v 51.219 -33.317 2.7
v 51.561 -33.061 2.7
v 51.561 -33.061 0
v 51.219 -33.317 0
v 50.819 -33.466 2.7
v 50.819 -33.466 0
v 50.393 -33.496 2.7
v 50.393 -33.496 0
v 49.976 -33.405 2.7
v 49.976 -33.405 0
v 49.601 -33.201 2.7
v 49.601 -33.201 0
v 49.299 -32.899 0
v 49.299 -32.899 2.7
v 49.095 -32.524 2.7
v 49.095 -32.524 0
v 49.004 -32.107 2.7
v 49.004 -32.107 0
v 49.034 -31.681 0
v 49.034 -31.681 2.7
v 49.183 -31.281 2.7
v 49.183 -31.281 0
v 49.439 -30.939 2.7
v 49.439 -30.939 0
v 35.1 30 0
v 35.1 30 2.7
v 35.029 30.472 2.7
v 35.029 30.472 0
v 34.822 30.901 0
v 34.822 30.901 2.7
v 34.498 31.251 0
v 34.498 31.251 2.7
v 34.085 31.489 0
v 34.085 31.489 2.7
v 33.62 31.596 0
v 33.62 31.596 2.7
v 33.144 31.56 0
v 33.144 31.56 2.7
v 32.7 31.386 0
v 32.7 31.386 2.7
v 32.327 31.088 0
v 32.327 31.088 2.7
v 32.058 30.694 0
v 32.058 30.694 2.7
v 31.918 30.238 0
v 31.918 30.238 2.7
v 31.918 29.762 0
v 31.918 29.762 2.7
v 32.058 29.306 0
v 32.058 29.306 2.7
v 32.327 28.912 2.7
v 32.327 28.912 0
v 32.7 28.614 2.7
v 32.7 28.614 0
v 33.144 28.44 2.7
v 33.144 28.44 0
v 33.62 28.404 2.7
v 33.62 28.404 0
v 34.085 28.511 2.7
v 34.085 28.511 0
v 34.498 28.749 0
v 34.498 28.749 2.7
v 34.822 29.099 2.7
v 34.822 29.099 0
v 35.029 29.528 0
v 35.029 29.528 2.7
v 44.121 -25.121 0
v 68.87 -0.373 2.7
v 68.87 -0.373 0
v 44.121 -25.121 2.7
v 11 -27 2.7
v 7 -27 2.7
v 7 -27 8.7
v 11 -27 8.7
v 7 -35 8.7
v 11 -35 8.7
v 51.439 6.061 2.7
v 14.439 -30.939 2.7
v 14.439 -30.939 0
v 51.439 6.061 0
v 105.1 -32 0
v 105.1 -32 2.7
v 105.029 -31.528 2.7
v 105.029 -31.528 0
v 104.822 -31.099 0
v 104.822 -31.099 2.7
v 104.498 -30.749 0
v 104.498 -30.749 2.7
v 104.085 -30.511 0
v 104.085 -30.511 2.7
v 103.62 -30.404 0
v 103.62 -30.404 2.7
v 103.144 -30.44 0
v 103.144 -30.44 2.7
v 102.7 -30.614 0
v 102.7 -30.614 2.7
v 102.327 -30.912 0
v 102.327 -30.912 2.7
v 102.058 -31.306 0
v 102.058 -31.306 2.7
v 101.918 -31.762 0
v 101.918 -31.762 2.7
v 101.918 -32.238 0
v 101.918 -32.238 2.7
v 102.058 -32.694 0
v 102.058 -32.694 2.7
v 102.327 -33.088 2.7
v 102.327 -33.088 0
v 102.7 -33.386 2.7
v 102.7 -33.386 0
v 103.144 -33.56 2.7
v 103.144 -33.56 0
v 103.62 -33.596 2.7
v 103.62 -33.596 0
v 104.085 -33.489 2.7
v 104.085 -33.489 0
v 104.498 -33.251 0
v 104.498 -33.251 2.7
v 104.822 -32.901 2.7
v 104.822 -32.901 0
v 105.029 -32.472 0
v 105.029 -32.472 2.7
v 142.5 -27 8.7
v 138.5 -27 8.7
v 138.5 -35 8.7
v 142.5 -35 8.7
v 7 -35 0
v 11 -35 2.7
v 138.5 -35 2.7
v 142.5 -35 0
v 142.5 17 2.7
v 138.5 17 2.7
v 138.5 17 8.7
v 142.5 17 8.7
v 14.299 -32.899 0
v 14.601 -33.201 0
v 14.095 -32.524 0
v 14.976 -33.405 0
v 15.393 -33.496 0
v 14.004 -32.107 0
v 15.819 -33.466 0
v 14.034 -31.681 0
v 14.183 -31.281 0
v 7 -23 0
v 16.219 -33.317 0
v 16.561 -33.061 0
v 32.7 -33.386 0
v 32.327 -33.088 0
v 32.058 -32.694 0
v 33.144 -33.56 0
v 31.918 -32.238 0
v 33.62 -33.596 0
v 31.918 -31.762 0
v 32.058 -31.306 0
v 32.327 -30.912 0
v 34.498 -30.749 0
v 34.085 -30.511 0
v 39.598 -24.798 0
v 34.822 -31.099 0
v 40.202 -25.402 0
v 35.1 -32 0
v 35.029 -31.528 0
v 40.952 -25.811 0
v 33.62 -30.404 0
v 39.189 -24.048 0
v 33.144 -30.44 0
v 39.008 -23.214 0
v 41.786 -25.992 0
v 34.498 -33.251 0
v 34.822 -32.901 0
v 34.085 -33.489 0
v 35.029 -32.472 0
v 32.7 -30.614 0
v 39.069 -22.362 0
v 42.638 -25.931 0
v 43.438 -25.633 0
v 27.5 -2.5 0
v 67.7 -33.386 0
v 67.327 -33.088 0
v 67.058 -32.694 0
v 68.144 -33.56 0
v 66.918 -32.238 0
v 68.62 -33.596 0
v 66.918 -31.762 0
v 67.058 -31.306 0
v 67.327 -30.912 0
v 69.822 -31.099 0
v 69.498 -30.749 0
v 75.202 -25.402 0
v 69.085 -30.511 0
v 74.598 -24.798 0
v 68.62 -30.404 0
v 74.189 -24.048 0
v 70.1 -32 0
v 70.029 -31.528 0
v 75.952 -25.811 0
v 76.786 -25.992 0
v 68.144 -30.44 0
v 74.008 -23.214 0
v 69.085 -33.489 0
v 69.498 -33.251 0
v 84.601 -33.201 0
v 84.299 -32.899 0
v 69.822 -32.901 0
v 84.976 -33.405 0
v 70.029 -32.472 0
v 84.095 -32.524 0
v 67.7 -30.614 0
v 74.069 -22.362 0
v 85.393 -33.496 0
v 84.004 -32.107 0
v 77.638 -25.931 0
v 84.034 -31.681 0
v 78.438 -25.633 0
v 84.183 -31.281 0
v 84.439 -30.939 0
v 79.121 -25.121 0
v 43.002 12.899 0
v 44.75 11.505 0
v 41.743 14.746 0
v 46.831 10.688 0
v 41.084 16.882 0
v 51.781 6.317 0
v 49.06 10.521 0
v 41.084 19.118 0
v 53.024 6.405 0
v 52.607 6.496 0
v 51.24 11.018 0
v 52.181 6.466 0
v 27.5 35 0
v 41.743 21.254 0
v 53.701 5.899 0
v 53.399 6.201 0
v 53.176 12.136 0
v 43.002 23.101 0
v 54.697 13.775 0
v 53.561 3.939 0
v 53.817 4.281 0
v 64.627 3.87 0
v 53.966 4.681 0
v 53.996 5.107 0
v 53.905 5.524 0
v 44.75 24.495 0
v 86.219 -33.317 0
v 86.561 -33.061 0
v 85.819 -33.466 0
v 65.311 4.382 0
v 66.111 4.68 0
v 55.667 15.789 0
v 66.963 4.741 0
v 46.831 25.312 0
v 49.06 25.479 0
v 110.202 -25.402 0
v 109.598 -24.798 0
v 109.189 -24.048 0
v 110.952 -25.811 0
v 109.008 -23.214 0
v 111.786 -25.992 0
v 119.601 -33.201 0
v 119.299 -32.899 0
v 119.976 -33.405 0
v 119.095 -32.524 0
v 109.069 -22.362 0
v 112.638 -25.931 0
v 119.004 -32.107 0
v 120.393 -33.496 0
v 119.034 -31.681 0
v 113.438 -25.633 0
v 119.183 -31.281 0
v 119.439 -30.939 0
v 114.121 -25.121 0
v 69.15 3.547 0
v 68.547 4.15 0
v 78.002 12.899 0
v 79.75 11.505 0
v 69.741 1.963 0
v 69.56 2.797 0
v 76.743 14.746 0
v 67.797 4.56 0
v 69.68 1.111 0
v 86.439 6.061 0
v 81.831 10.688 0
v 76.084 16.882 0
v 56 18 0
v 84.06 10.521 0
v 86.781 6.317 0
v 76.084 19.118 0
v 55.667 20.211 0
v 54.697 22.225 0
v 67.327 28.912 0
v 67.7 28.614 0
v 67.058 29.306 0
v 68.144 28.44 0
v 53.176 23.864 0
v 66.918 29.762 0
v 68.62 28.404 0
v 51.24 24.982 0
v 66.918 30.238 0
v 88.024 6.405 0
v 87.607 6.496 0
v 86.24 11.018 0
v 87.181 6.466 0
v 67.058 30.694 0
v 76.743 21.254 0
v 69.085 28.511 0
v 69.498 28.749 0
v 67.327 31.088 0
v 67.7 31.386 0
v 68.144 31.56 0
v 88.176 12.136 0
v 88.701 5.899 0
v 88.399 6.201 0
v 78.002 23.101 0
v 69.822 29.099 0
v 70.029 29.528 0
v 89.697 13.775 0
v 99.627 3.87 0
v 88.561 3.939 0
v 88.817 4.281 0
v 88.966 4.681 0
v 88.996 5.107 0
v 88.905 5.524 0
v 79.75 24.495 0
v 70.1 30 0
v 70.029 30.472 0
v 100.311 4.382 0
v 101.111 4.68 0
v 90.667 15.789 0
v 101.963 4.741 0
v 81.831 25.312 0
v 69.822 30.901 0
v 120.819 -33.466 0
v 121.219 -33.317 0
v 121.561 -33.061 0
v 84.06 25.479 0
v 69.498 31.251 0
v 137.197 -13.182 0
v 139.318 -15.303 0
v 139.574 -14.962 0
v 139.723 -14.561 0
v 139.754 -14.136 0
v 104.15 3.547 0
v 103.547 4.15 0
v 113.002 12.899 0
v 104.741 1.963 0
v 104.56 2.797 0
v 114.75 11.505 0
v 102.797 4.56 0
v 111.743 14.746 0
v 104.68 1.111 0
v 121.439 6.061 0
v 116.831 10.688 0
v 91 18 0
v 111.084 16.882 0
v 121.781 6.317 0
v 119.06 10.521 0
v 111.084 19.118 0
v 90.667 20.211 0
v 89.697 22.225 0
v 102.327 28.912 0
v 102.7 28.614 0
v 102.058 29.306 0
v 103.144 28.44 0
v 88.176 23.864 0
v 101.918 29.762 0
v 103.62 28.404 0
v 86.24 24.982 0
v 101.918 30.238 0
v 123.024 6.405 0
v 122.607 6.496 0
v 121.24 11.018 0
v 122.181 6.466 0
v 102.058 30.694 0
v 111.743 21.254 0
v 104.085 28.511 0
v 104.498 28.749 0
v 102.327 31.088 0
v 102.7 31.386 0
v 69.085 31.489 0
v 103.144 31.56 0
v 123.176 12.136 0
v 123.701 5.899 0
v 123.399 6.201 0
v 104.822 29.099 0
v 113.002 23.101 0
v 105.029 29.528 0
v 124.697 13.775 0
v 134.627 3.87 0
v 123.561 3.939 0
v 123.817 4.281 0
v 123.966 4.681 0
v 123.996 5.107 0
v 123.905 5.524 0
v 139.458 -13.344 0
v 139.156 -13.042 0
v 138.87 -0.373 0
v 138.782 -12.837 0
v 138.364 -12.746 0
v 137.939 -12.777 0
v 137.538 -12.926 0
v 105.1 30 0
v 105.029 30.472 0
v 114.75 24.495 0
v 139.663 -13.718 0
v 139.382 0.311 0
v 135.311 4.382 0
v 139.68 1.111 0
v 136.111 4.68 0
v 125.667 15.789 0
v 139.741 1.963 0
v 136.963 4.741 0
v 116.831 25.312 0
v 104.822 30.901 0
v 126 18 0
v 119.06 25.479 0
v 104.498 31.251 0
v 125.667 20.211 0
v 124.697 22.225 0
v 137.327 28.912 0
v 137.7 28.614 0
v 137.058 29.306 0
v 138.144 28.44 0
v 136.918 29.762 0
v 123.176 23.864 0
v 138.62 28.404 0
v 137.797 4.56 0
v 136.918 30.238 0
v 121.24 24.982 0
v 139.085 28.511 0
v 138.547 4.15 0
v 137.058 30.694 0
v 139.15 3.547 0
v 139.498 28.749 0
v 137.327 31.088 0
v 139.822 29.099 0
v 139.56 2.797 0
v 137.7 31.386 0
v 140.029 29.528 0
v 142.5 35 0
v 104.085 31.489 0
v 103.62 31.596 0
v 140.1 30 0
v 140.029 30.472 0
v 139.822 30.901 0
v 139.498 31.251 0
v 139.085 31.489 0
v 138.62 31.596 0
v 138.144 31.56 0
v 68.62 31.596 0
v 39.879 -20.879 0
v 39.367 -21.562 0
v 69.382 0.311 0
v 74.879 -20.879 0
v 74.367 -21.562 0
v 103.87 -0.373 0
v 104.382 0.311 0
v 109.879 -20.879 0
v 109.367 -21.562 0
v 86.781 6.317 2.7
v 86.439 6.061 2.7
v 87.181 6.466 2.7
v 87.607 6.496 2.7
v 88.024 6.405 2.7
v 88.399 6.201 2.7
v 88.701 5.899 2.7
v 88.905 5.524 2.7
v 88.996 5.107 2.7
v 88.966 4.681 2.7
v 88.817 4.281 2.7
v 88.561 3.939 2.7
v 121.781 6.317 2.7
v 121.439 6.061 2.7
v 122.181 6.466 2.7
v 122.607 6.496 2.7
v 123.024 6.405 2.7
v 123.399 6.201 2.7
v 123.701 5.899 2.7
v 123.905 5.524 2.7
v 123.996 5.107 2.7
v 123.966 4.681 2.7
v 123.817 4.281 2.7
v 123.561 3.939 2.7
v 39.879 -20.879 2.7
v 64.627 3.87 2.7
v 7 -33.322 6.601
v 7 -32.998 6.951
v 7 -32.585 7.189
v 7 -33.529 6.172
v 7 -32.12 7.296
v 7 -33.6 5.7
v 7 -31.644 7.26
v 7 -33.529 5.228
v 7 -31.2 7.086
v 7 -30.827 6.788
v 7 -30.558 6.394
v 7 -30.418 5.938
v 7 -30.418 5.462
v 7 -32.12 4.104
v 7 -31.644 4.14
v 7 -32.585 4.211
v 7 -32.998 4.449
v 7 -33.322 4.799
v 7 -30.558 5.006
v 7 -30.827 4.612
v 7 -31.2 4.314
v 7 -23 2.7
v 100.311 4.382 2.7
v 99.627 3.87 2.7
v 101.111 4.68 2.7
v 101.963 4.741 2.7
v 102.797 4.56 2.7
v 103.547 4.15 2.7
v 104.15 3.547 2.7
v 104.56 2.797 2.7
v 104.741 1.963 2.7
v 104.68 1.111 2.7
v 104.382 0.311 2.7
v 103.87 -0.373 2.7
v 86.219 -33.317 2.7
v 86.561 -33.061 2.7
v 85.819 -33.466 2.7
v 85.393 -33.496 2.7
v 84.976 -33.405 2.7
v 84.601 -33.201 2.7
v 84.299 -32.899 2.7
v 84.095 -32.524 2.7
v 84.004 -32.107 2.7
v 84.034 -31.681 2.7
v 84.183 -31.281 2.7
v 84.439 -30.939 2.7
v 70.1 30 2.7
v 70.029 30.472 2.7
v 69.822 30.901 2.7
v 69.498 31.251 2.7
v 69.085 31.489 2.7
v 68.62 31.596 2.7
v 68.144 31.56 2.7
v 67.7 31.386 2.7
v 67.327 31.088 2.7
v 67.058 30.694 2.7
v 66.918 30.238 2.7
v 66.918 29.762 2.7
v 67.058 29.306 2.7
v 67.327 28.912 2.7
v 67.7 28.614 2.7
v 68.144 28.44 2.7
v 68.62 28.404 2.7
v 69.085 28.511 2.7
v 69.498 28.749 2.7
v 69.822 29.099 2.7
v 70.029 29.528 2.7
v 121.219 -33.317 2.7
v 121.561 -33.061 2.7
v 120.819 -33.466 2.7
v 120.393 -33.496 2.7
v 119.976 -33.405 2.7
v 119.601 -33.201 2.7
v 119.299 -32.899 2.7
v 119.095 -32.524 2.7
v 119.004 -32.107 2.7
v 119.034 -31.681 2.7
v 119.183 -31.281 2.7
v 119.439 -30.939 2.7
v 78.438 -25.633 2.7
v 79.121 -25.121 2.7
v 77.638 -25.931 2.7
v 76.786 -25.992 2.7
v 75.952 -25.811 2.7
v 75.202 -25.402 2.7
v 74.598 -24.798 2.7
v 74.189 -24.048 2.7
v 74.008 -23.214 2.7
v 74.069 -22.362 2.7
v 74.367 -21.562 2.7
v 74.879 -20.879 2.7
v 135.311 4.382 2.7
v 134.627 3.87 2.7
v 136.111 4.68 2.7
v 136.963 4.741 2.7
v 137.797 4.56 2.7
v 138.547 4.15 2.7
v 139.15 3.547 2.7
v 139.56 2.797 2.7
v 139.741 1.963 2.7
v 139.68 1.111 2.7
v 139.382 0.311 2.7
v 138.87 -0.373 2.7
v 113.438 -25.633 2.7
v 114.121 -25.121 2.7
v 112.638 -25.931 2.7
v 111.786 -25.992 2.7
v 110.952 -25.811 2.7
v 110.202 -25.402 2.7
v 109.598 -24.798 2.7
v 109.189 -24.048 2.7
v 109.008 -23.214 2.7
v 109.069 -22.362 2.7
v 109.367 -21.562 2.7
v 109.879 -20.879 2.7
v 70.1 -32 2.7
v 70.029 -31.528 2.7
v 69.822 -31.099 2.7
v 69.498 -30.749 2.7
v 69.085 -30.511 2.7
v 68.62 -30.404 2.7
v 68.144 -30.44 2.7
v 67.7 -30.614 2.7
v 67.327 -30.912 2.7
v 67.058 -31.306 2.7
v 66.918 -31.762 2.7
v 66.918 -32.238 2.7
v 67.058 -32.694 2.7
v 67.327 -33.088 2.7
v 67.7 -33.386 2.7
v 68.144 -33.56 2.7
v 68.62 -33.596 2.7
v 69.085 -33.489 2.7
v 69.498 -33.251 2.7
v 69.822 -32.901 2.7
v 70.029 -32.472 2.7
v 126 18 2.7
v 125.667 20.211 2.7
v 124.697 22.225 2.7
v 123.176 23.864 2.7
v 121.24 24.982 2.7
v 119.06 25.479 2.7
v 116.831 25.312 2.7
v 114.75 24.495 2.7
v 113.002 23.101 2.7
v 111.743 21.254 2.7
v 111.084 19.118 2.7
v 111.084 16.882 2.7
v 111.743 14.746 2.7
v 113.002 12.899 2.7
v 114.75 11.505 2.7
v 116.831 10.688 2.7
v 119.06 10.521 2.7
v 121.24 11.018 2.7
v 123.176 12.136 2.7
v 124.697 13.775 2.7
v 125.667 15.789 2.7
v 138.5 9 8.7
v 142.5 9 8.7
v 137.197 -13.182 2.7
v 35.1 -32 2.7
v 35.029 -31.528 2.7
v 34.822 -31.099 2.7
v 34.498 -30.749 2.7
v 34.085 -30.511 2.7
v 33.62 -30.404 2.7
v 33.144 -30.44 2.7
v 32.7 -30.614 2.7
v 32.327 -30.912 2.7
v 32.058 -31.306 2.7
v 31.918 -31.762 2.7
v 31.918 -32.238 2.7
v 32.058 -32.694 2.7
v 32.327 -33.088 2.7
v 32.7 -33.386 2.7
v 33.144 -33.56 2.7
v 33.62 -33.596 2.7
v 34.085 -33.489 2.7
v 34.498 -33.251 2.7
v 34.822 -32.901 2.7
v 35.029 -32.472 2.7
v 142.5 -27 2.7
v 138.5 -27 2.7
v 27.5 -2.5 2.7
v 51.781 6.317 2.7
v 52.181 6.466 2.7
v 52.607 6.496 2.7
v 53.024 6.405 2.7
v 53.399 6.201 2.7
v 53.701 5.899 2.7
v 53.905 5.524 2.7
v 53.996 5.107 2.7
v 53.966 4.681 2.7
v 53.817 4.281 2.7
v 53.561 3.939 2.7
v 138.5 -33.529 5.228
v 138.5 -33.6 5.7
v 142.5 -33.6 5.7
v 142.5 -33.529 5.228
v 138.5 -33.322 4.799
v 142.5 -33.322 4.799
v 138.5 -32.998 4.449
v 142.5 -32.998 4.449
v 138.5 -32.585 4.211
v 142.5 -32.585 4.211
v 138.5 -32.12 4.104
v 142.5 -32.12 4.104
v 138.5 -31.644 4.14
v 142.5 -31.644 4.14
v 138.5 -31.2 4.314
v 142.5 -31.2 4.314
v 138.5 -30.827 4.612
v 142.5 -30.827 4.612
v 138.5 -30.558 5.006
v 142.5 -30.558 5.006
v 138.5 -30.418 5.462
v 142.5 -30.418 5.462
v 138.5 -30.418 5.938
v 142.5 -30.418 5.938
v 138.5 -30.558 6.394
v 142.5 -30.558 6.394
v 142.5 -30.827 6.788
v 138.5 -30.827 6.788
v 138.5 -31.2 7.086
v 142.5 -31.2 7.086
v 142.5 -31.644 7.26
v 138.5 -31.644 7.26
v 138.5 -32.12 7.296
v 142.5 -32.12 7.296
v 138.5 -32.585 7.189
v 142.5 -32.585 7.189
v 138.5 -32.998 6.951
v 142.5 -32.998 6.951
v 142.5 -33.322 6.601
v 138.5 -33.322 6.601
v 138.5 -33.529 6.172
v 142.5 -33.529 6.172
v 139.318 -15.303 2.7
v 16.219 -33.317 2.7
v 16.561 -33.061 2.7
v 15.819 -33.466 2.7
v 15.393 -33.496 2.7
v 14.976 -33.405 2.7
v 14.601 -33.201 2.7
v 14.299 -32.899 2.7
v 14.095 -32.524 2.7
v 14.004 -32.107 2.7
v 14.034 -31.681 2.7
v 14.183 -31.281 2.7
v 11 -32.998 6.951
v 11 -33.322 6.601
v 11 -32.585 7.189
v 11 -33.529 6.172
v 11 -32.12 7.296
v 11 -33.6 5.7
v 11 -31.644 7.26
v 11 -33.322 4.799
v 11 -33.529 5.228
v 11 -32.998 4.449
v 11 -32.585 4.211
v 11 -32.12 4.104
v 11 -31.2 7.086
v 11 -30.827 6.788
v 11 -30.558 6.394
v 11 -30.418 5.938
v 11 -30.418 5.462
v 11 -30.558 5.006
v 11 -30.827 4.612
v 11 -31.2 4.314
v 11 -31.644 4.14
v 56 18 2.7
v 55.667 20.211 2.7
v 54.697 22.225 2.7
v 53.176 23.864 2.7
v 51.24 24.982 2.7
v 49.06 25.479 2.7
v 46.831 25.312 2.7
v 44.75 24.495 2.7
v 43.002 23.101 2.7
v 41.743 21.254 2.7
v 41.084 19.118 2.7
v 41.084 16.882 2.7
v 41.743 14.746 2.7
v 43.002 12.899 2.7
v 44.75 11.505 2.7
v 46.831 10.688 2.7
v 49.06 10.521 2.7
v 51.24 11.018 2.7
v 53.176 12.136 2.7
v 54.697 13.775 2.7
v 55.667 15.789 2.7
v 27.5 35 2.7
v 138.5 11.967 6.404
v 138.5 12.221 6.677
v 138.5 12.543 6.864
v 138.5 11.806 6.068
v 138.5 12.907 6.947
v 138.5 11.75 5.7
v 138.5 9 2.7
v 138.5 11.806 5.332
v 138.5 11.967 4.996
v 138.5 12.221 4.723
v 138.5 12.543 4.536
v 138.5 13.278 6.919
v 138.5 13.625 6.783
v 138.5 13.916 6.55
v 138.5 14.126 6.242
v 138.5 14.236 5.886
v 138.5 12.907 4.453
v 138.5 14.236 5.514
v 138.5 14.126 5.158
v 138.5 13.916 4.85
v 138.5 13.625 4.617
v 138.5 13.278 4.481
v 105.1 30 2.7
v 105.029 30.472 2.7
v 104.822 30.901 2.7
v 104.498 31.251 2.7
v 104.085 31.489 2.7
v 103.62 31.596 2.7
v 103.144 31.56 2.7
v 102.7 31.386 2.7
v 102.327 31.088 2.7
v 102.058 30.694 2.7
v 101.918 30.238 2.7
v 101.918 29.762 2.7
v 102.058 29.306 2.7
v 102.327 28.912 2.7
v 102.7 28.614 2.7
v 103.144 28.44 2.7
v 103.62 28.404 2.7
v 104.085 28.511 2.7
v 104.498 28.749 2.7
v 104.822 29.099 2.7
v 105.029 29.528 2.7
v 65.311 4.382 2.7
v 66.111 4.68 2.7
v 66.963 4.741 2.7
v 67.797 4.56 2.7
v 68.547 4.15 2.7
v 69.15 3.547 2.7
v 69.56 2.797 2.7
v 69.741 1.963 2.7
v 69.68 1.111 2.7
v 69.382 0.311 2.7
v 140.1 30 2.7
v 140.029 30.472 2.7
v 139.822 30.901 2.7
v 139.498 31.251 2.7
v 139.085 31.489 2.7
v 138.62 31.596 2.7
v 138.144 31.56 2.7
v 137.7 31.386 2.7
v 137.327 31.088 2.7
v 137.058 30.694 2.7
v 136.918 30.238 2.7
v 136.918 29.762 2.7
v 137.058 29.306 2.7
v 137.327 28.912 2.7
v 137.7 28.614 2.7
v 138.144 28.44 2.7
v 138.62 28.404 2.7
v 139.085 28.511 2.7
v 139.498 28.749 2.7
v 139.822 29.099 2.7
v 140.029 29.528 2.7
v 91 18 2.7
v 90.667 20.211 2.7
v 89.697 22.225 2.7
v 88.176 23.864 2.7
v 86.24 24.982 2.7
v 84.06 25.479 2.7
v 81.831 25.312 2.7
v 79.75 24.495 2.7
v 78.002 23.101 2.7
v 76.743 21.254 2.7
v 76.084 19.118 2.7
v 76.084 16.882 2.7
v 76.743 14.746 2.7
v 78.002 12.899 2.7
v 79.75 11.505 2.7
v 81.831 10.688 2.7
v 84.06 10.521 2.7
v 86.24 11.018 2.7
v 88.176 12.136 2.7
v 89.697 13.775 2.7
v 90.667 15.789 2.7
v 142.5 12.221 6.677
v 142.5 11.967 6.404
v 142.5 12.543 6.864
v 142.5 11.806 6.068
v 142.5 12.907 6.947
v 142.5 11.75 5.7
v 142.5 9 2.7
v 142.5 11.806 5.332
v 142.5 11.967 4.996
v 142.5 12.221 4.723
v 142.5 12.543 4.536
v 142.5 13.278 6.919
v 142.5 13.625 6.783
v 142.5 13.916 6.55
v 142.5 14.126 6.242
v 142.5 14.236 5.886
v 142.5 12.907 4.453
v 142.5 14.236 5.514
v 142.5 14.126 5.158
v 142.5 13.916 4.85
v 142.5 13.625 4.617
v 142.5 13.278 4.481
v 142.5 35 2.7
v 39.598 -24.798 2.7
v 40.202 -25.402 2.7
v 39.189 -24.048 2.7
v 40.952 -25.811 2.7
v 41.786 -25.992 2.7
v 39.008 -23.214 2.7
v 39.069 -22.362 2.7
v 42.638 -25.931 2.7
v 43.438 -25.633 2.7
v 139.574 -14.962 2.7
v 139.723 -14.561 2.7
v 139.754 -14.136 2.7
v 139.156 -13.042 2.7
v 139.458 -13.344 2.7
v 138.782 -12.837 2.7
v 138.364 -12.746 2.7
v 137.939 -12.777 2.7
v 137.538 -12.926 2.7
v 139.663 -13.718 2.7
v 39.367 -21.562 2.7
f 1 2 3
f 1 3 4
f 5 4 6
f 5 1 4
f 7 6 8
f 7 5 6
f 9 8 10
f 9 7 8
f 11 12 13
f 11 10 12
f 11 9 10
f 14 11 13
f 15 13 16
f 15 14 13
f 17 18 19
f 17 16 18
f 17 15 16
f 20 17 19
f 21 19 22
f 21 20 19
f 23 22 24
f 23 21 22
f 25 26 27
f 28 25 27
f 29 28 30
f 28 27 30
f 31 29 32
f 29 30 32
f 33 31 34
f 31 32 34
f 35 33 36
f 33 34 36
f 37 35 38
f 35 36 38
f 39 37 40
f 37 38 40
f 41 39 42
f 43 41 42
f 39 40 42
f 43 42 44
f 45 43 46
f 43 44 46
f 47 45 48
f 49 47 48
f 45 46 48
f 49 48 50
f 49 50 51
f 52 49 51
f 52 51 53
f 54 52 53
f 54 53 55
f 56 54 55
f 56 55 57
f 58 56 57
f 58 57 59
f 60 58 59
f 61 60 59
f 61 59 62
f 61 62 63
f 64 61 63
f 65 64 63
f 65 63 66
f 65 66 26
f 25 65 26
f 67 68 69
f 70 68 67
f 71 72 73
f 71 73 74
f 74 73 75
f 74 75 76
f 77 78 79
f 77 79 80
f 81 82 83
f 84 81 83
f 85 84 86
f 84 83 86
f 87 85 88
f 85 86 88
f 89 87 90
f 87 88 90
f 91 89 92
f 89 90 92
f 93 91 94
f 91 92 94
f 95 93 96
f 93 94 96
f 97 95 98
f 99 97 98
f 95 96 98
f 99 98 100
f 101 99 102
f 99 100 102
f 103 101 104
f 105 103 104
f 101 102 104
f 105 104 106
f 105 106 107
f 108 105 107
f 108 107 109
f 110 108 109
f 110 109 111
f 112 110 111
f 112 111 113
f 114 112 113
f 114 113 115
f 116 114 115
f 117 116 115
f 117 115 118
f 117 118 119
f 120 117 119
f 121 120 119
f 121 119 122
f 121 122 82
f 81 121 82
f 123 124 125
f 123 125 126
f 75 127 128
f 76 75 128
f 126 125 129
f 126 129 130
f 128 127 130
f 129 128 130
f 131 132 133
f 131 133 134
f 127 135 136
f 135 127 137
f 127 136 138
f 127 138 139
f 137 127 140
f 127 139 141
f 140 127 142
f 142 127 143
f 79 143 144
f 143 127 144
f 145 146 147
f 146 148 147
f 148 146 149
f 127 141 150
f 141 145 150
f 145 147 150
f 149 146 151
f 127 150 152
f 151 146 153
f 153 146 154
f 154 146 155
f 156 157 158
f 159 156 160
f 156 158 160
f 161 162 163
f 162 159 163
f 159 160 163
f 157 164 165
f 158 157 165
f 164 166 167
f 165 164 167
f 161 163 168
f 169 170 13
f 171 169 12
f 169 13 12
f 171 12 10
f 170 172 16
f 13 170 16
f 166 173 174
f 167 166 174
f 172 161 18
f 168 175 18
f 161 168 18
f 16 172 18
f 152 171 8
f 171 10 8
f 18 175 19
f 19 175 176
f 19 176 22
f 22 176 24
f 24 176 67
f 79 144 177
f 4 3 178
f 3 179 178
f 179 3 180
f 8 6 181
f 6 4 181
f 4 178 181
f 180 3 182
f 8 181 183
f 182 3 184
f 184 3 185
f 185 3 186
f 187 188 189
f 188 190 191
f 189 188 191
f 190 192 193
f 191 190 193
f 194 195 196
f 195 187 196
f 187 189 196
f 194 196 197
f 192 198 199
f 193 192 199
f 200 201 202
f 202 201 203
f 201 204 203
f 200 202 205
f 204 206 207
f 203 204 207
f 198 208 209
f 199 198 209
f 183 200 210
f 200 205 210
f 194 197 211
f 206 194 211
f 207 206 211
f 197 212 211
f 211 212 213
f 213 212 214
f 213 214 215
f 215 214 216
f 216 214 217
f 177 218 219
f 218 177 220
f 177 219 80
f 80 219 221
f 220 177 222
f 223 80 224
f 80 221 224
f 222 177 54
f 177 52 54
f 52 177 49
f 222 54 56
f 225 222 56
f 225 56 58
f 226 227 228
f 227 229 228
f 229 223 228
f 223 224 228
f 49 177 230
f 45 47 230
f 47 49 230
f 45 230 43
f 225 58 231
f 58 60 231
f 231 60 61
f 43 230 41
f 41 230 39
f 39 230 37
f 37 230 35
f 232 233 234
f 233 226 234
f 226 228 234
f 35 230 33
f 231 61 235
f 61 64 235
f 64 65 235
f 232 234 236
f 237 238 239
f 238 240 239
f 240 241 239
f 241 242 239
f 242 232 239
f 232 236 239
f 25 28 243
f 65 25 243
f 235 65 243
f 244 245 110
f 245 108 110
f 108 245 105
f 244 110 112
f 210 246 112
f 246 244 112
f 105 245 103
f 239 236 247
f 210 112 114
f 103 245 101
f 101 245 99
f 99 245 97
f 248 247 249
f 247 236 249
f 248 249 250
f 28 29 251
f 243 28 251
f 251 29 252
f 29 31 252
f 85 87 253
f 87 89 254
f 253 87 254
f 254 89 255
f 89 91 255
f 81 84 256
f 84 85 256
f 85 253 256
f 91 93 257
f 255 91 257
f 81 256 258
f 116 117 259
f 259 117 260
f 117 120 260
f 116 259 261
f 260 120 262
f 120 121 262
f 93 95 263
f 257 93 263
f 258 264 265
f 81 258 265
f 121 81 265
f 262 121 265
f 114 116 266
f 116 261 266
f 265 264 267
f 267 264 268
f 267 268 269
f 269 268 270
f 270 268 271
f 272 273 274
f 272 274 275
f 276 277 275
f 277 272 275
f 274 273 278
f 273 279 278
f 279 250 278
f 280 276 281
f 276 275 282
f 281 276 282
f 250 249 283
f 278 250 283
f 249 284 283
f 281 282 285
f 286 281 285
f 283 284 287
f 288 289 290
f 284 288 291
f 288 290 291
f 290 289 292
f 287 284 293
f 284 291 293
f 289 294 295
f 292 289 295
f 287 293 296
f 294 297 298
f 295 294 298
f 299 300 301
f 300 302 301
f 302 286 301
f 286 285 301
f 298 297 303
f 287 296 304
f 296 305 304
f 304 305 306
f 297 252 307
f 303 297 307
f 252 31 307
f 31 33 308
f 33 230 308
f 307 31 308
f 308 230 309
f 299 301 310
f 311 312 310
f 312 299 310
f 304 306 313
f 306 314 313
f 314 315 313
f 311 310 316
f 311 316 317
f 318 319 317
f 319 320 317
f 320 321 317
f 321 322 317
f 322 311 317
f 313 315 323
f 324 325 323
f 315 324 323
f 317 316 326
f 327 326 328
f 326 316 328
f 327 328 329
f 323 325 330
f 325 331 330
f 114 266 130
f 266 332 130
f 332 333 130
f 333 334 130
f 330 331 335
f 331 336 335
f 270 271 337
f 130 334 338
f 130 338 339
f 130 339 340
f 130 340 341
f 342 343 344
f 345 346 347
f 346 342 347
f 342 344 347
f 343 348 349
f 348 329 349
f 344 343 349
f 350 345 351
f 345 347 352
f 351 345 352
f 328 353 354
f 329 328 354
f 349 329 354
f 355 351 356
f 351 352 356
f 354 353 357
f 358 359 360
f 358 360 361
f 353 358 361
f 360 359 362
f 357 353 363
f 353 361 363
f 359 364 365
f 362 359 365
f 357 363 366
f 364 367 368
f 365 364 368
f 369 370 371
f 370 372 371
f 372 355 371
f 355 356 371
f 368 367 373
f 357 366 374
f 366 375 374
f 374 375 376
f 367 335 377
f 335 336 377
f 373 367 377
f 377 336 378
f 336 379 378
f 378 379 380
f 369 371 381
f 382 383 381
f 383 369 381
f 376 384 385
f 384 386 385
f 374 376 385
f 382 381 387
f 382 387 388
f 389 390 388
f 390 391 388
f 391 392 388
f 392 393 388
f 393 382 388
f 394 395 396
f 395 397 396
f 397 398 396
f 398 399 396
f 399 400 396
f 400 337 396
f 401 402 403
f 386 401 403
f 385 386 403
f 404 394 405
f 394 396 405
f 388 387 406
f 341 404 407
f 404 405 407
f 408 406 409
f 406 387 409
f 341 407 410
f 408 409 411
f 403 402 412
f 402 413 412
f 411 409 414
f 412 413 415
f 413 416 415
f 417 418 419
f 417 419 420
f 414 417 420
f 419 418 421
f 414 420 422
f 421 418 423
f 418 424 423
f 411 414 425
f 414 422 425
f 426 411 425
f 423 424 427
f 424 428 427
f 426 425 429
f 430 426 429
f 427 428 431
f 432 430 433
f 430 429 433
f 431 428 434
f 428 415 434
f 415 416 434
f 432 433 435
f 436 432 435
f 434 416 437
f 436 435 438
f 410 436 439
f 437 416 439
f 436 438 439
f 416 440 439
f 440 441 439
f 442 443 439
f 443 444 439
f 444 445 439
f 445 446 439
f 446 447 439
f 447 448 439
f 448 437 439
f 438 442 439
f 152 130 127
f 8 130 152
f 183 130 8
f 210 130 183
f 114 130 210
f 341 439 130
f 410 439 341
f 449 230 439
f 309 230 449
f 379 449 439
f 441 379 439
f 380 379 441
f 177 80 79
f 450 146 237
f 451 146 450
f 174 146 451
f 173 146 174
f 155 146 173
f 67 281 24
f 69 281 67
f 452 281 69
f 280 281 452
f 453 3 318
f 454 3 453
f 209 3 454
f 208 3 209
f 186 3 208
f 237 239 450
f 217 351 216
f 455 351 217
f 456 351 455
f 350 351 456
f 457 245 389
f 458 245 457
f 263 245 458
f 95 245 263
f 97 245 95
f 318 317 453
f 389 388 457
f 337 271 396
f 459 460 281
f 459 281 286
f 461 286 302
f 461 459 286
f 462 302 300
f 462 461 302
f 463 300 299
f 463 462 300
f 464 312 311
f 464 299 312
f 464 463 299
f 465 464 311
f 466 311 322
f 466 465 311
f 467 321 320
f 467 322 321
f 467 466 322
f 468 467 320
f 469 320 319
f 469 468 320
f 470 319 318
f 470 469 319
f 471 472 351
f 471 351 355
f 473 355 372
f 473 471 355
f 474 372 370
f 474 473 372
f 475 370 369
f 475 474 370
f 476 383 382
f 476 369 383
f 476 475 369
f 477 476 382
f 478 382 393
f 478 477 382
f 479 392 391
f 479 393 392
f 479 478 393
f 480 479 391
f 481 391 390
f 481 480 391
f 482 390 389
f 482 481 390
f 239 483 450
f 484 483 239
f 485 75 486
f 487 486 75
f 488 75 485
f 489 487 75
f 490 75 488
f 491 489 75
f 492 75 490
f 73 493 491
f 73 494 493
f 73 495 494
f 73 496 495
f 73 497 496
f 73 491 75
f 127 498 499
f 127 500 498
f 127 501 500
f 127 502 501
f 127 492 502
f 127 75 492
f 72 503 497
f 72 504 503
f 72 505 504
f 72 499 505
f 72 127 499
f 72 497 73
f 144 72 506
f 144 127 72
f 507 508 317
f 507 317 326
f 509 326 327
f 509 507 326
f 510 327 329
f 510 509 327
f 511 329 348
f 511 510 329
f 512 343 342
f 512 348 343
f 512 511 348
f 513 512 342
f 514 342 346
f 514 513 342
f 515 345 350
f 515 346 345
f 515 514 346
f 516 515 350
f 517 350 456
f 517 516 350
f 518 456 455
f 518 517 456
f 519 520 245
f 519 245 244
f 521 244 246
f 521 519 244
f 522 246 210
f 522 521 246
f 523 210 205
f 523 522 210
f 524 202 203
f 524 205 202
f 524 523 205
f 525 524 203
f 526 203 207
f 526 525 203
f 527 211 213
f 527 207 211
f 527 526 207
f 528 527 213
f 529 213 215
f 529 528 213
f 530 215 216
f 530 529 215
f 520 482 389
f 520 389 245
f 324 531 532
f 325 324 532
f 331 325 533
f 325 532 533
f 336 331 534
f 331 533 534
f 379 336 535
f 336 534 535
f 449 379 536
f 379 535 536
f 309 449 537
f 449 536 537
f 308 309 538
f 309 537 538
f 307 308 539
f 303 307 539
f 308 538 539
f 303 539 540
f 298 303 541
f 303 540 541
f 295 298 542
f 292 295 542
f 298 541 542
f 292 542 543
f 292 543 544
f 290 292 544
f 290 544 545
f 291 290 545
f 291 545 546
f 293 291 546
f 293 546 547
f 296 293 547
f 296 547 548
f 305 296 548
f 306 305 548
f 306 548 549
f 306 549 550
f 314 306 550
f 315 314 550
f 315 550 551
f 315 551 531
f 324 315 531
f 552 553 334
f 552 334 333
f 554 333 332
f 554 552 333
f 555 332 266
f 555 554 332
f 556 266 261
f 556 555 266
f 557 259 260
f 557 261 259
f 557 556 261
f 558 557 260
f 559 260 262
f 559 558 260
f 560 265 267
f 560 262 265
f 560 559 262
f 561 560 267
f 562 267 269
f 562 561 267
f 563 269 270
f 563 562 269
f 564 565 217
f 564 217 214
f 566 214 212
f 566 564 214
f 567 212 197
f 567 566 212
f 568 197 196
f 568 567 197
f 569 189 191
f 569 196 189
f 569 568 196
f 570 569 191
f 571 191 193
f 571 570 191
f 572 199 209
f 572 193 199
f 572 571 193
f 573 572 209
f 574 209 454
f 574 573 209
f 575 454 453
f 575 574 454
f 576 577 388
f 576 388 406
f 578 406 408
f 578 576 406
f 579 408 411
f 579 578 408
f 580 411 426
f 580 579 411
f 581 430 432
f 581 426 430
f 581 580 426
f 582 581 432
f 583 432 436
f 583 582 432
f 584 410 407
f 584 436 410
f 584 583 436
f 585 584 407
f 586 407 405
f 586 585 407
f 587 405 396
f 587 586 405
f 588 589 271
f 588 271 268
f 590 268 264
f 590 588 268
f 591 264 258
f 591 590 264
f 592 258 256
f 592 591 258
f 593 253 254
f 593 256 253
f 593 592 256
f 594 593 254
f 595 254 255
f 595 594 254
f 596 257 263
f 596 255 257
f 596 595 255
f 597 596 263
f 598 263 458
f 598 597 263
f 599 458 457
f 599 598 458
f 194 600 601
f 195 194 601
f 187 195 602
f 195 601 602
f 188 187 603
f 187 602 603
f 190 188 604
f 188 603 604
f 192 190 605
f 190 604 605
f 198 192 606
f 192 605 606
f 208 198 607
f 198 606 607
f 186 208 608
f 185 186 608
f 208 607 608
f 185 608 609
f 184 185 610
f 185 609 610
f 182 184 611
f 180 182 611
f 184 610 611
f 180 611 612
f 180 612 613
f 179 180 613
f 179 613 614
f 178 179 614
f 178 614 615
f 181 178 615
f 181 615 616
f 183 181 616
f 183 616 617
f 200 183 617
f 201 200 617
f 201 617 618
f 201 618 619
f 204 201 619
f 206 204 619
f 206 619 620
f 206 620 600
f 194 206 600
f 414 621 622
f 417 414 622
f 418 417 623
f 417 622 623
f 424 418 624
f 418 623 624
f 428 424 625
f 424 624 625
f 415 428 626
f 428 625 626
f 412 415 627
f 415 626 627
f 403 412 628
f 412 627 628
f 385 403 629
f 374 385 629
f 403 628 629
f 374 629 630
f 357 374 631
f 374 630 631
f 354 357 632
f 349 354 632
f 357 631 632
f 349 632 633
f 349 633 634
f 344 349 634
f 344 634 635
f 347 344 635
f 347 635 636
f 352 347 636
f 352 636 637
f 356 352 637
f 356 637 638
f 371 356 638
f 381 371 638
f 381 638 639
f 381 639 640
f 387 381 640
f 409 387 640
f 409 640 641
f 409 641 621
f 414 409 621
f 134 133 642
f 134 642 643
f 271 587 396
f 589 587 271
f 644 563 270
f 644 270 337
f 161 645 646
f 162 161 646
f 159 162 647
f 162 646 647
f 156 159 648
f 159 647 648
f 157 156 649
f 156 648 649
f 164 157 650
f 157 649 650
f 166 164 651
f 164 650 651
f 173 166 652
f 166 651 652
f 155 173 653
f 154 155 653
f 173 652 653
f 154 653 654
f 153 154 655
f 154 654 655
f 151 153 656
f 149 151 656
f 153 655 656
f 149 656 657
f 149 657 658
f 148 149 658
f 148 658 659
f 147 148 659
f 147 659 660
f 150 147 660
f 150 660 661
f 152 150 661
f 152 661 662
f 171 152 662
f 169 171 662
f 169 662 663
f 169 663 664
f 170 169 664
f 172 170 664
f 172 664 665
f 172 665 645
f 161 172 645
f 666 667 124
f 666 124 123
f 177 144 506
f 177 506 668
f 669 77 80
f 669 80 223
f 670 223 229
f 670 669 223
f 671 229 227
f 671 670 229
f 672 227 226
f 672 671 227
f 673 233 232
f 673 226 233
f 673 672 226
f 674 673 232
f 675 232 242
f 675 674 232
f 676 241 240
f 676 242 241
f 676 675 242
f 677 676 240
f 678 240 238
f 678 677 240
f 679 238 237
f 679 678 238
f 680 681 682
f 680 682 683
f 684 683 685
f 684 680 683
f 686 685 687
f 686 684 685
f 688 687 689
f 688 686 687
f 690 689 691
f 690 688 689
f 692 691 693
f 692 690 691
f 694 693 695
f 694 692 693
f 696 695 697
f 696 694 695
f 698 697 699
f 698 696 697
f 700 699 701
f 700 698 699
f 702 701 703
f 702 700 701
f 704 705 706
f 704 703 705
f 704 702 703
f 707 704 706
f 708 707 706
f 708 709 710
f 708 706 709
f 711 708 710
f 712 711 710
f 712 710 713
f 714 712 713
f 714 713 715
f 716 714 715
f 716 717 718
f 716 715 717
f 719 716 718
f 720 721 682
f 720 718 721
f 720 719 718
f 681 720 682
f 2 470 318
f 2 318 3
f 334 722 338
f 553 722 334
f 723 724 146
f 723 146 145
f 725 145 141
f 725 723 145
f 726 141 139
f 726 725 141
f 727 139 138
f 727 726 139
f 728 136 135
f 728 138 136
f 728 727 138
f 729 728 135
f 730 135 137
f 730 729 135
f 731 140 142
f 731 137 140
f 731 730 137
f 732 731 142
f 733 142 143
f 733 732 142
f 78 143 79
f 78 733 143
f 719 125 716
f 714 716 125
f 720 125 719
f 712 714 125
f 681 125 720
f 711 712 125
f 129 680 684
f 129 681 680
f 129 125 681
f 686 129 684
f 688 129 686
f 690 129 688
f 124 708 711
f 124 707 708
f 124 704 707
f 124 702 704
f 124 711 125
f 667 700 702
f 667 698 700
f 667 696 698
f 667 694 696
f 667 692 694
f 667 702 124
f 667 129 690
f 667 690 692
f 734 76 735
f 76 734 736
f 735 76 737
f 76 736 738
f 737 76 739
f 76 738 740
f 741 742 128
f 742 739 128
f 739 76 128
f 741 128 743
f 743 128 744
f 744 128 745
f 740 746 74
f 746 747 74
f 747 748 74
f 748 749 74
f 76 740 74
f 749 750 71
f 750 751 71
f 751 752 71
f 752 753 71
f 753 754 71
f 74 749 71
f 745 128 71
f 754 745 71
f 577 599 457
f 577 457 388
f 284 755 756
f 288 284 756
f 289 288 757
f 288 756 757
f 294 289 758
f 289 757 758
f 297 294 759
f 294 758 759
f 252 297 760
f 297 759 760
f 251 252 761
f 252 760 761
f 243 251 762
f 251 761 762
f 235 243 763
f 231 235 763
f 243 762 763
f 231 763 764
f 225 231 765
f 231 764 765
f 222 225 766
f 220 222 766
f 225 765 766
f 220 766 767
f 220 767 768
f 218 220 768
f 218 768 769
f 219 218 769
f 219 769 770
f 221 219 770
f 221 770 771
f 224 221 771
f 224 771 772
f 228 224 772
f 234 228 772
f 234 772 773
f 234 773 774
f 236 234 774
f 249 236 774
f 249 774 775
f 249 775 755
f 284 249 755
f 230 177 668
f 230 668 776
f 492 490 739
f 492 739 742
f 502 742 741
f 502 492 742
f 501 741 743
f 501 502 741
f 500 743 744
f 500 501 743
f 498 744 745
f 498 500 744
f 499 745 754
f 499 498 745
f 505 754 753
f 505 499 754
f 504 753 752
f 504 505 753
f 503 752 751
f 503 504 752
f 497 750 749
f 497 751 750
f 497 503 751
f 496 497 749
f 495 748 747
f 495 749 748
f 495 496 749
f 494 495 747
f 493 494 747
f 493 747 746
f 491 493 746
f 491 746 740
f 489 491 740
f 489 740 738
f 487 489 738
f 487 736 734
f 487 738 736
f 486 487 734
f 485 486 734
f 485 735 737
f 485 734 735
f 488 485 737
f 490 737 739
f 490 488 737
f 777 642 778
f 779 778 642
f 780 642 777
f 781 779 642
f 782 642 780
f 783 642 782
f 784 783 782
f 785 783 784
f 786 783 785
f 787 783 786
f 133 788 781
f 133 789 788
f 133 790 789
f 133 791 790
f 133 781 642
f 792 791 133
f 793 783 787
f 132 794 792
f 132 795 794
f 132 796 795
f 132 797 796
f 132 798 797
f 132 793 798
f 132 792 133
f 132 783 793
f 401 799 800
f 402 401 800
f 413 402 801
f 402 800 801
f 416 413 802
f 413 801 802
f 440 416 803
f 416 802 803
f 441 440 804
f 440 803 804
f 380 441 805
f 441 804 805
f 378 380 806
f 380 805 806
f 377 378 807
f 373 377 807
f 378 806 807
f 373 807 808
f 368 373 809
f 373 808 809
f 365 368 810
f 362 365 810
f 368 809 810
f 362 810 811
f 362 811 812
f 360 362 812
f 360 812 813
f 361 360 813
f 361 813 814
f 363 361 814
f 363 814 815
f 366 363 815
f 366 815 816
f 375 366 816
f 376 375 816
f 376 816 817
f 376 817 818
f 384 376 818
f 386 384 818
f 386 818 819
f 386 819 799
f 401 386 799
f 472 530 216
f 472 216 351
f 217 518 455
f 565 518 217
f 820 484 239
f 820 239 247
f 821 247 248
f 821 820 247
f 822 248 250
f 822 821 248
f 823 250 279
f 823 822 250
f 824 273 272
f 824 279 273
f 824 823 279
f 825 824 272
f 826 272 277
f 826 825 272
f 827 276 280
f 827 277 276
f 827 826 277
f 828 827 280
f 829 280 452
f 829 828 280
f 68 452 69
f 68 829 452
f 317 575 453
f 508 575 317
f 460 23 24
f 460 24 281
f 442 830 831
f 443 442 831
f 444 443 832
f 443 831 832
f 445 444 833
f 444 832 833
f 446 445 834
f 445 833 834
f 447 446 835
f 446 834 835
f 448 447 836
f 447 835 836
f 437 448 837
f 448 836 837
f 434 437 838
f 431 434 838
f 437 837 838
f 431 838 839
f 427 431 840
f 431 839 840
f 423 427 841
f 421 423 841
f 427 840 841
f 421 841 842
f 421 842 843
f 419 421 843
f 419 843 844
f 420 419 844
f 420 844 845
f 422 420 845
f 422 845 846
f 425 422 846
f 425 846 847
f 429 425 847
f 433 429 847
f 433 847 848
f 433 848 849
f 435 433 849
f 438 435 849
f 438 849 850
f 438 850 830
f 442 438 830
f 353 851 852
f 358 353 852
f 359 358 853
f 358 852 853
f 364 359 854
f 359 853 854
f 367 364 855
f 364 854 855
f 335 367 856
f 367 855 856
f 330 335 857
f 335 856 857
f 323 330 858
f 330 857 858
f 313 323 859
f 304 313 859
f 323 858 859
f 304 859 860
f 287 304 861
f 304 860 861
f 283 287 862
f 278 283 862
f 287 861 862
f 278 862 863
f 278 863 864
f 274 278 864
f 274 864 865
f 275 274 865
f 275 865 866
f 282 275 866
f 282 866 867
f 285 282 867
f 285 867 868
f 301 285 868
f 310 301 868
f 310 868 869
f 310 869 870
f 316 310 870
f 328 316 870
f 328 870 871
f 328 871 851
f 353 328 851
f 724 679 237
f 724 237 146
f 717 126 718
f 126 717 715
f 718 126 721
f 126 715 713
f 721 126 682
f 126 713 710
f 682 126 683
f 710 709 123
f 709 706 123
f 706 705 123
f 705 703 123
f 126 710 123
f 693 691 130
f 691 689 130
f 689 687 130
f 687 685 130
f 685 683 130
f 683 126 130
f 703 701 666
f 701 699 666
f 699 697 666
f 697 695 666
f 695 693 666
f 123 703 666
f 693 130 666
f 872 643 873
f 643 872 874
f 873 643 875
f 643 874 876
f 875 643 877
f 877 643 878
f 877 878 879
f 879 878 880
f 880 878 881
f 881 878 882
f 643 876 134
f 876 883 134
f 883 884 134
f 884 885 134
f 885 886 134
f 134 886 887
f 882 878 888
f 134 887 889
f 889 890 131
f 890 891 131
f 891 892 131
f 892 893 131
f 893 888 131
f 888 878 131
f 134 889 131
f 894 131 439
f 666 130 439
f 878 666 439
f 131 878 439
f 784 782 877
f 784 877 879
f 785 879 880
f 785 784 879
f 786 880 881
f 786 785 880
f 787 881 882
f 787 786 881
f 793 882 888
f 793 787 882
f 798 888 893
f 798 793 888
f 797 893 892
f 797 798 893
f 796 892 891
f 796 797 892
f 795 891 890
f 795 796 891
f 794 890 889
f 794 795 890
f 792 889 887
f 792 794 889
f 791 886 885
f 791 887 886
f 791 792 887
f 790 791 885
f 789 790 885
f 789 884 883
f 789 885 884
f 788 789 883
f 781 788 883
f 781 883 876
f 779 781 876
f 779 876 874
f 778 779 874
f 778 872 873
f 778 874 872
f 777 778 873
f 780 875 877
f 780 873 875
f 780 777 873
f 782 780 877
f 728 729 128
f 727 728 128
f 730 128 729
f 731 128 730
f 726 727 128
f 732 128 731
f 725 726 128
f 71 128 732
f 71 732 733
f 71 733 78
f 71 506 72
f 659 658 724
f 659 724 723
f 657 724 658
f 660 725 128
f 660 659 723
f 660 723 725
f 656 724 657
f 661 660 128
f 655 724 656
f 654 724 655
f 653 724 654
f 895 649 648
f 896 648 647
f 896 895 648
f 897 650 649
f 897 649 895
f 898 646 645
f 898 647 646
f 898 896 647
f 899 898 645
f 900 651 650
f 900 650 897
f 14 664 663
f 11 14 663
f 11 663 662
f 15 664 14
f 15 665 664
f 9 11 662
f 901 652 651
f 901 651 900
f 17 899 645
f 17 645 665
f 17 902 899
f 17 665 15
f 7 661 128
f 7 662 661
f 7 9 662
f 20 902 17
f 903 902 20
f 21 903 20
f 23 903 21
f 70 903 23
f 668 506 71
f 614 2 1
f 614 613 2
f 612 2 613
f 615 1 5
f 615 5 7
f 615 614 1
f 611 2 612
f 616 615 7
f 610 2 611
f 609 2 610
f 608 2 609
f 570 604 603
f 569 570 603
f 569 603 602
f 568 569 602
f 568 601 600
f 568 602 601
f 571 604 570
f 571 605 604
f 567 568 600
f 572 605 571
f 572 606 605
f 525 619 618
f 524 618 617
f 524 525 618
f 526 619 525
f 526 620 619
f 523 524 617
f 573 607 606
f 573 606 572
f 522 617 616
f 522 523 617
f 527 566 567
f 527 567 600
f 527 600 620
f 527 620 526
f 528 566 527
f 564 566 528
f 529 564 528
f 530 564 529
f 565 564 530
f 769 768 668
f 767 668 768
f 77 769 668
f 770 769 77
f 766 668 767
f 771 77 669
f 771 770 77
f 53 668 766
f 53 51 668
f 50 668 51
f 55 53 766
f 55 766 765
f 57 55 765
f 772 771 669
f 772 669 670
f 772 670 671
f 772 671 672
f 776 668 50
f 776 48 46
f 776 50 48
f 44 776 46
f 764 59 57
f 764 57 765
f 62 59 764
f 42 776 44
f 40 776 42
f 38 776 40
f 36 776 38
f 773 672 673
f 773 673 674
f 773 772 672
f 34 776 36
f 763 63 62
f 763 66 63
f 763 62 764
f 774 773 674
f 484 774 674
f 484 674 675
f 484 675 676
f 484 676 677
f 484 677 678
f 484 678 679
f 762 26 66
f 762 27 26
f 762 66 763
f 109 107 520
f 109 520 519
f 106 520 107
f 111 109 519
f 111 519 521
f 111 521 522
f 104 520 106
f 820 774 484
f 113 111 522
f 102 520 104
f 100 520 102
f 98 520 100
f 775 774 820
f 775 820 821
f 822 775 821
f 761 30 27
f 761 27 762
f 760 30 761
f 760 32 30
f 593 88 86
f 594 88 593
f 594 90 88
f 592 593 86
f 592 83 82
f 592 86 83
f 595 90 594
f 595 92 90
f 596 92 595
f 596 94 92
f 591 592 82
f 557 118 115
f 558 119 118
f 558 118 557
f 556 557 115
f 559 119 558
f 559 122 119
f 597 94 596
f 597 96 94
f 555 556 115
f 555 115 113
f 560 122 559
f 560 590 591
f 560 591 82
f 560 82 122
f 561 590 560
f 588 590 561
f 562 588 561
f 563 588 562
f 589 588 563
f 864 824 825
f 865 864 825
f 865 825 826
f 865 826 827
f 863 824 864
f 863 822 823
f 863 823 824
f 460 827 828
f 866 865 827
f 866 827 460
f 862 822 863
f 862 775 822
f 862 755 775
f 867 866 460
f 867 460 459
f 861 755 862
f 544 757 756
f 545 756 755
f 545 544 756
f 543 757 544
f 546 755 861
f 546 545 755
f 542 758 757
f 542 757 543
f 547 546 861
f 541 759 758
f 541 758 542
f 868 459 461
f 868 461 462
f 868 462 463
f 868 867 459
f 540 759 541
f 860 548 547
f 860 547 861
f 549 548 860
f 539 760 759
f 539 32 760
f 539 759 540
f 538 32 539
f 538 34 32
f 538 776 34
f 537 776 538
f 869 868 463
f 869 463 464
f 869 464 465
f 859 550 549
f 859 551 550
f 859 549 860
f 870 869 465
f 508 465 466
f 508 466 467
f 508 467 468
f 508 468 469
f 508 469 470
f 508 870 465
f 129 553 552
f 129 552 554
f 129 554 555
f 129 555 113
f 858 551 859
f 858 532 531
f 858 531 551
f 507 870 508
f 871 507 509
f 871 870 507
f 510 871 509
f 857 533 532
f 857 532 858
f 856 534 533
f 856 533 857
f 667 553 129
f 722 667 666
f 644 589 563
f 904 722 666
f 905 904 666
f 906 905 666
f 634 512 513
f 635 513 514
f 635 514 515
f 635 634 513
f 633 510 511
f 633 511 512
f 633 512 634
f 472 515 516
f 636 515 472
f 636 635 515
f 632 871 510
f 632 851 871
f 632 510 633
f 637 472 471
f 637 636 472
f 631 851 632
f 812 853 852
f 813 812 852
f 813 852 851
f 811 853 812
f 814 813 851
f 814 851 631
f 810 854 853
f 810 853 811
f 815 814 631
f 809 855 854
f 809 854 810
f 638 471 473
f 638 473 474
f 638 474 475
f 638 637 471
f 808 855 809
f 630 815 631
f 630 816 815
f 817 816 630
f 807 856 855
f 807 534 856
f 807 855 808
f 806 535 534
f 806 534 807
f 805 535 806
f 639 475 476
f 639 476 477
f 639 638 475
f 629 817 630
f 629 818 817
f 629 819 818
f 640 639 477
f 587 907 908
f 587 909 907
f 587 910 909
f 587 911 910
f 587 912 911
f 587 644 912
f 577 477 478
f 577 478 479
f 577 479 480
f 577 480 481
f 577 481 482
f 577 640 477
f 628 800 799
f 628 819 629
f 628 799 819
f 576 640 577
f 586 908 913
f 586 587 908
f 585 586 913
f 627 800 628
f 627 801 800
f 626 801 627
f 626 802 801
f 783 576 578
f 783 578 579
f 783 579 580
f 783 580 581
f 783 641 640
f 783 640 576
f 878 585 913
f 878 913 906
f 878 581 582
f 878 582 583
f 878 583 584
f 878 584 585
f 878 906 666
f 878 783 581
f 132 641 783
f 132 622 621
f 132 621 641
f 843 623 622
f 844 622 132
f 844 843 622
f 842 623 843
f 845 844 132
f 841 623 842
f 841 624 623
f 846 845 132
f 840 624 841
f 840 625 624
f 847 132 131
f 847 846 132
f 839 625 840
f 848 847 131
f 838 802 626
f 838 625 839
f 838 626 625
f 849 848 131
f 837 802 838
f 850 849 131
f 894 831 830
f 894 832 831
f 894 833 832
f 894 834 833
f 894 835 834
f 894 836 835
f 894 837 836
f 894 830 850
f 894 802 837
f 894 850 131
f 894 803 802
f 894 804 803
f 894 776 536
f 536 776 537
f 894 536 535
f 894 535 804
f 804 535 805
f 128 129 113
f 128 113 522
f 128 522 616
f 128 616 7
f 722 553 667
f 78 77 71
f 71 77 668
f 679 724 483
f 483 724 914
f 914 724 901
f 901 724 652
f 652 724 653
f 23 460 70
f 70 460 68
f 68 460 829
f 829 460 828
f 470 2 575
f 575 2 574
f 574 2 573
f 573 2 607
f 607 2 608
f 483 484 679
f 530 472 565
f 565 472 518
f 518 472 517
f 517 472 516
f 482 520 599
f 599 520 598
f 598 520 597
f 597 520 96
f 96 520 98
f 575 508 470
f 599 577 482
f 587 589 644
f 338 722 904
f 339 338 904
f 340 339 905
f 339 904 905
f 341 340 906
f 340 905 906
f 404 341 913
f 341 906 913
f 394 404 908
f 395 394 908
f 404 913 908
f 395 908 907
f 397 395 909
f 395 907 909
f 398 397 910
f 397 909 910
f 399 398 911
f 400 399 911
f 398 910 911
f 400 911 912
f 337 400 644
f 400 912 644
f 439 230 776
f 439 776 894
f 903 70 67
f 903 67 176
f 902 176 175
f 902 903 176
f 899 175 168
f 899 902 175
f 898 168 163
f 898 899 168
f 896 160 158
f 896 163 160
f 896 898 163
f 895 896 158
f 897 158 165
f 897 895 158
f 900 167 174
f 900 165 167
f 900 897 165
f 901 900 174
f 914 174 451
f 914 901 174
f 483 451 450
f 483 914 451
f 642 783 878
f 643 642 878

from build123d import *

# Parameters (mm, degrees)
SKETCH_1_W               = 285
SKETCH_1_H               = 70
EXTRUDE_1_DEPTH          = 2.7
SKETCH_2_R               = 1.6
SKETCH_2_R_2             = 7.5
CUT_EXTRUDE_1_DEPTH      = 147.760144453
PATTERN_LINEAR_1_COUNT   = 8
PATTERN_LINEAR_1_PITCH   = 35
SKETCH_5_W               = 4
SKETCH_5_H               = 8
SKETCH_5_W_2             = 8
EXTRUDE_3_DEPTH          = 6
CUT_EXTRUDE_3_DEPTH      = 284.304941715
CUT_EXTRUDE_3_DEPTH_BACK = 284.304941715
SKETCH_7_R               = 1.6
SKETCH_7_R_2             = 1.25
SKETCH_9_R               = 3
EXTRUDE_4_DEPTH          = 2.7
CUT_EXTRUDE_4_DEPTH      = 147.857924539
PATTERN_LINEAR_2_COUNT   = 7
PATTERN_LINEAR_2_PITCH   = 35
PATTERN_LINEAR_3_COUNT   = 2
PATTERN_LINEAR_3_PITCH   = 35
CUT_EXTRUDE_2_DEPTH      = 147.857924539
CUT_EXTRUDE_2_DEPTH_BACK = 147.857924539


with BuildPart() as part:
    # 草图1 → 凸台-拉伸1 (new body)
    with BuildSketch(Plane.XY):
        Rectangle(SKETCH_1_W, SKETCH_1_H)
    extrude(amount=EXTRUDE_1_DEPTH)

    # 草图2 → 切除-拉伸1 (cut, through all)
    with BuildSketch(Plane.XY.offset(2.7)):
        with Locations((-106.5, -32)):
            Circle(SKETCH_2_R)
        with Locations((-106.5, 30)):
            Circle(SKETCH_2_R)
        with Locations((-126.5, 18)):
            Circle(SKETCH_2_R_2)
        with BuildLine():
            Line((-125.560660172, -30.939339828), (-88.560660172, 6.060660172))
            ThreePointArc((-88.560660172, 6.060660172), (-86.439339828, 6.060660172), (-86.439339828, 3.939339828))
            Line((-86.439339828, 3.939339828), (-123.439339828, -33.060660172))
            ThreePointArc((-123.439339828, -33.060660172), (-125.560660172, -33.060660172), (-125.560660172, -30.939339828))
        make_face()
    cut_extrude_1 = extrude(amount=-CUT_EXTRUDE_1_DEPTH, mode=Mode.SUBTRACT)

    # 阵列(线性)1: 切除-拉伸1 ×8
    with Locations(*[(i * PATTERN_LINEAR_1_PITCH, 0, 0) for i in range(1, PATTERN_LINEAR_1_COUNT)]):
        add(cut_extrude_1, mode=Mode.SUBTRACT)

    # 草图5 → 凸台-拉伸3 (add)
    with BuildSketch(Plane.XY.offset(2.7)):
        with Locations((-140.5, -31)):
            Rectangle(SKETCH_5_W, SKETCH_5_H)
        with Locations((140.5, -31)):
            Rectangle(SKETCH_5_W, SKETCH_5_H)
        with Locations((7, -31)):
            Rectangle(SKETCH_5_W_2, SKETCH_5_H)
        with Locations((-140.5, 13)):
            Rectangle(SKETCH_5_W, SKETCH_5_H)
        with Locations((140.5, 13)):
            Rectangle(SKETCH_5_W, SKETCH_5_H)
        with Locations((-4, 13)):
            Rectangle(SKETCH_5_W, SKETCH_5_H)
    extrude(amount=EXTRUDE_3_DEPTH)

    # 草图7 → 切除-拉伸3 (cut, two sides: drawn at the far end of the back side and taken through both)
    with BuildSketch(Plane(origin=(-138.5, 0, 0), x_dir=(0, 0, -1), z_dir=(1, 0, 0)).offset(-CUT_EXTRUDE_3_DEPTH_BACK)):
        with Locations(Location((-5.7, -32, 0), (0, 0, 270))):
            Circle(SKETCH_7_R)
        with Locations(Location((-5.7, 13, 0), (0, 0, 270))):
            Circle(SKETCH_7_R_2)
    extrude(amount=CUT_EXTRUDE_3_DEPTH + CUT_EXTRUDE_3_DEPTH_BACK, mode=Mode.SUBTRACT)

    # 草图9 → 凸台-拉伸4 (add)
    with BuildSketch(Plane.XY.offset(2.7)):
        with Locations((138.5, -32)):
            Circle(SKETCH_9_R)
        with BuildLine():
            Line((137.196699141, -13.181980515), (142.5, -7.878679656))
            Line((142.5, -7.878679656), (142.5, -12.121320344))
            Line((142.5, -12.121320344), (139.318019485, -15.303300859))
            ThreePointArc((139.318019485, -15.303300859), (139.318019485, -13.181980515), (137.196699141, -13.181980515))
        make_face()
    extrude(amount=-EXTRUDE_4_DEPTH)

    # 草图10 → 切除-拉伸4 (cut, through all)
    with BuildSketch(Plane.XY.offset(2.7)):
        with BuildLine():
            Line((-100.121320344, -20.878679656), (-75.372583002, 3.870057685))
            ThreePointArc((-75.372583002, 3.870057685), (-71.129942315, 3.870057685), (-71.129942315, -0.372583002))
            Line((-71.129942315, -0.372583002), (-95.878679656, -25.121320344))
            ThreePointArc((-95.878679656, -25.121320344), (-100.121320344, -25.121320344), (-100.121320344, -20.878679656))
        make_face()
    cut_extrude_4 = extrude(amount=-CUT_EXTRUDE_4_DEPTH, mode=Mode.SUBTRACT)

    # 阵列(线性)2: 切除-拉伸4 ×7, 1 skipped
    with Locations(*[(i * PATTERN_LINEAR_2_PITCH, 0, 0) for i in range(1, PATTERN_LINEAR_2_COUNT) if i not in (3,)]):
        add(cut_extrude_4, mode=Mode.SUBTRACT)

    # 阵列(线性)3: 切除-拉伸4 ×2
    with Locations(*[(-i * PATTERN_LINEAR_3_PITCH, 0, 0) for i in range(1, PATTERN_LINEAR_3_COUNT)]):
        add(cut_extrude_4, mode=Mode.SUBTRACT)

    # 草图3 → 切除-拉伸2 (cut, two sides: drawn at the far end of the back side and taken through both)
    with BuildSketch(Plane.XY.offset(2.7).offset(-CUT_EXTRUDE_2_DEPTH_BACK)):
        Polygon((27.5, 35), (-142.5, 35), (-142.5, -35), (7, -35), (7, -23), (27.5, -2.5), align=None)
    extrude(amount=CUT_EXTRUDE_2_DEPTH + CUT_EXTRUDE_2_DEPTH_BACK, mode=Mode.SUBTRACT)


solid = part.part
